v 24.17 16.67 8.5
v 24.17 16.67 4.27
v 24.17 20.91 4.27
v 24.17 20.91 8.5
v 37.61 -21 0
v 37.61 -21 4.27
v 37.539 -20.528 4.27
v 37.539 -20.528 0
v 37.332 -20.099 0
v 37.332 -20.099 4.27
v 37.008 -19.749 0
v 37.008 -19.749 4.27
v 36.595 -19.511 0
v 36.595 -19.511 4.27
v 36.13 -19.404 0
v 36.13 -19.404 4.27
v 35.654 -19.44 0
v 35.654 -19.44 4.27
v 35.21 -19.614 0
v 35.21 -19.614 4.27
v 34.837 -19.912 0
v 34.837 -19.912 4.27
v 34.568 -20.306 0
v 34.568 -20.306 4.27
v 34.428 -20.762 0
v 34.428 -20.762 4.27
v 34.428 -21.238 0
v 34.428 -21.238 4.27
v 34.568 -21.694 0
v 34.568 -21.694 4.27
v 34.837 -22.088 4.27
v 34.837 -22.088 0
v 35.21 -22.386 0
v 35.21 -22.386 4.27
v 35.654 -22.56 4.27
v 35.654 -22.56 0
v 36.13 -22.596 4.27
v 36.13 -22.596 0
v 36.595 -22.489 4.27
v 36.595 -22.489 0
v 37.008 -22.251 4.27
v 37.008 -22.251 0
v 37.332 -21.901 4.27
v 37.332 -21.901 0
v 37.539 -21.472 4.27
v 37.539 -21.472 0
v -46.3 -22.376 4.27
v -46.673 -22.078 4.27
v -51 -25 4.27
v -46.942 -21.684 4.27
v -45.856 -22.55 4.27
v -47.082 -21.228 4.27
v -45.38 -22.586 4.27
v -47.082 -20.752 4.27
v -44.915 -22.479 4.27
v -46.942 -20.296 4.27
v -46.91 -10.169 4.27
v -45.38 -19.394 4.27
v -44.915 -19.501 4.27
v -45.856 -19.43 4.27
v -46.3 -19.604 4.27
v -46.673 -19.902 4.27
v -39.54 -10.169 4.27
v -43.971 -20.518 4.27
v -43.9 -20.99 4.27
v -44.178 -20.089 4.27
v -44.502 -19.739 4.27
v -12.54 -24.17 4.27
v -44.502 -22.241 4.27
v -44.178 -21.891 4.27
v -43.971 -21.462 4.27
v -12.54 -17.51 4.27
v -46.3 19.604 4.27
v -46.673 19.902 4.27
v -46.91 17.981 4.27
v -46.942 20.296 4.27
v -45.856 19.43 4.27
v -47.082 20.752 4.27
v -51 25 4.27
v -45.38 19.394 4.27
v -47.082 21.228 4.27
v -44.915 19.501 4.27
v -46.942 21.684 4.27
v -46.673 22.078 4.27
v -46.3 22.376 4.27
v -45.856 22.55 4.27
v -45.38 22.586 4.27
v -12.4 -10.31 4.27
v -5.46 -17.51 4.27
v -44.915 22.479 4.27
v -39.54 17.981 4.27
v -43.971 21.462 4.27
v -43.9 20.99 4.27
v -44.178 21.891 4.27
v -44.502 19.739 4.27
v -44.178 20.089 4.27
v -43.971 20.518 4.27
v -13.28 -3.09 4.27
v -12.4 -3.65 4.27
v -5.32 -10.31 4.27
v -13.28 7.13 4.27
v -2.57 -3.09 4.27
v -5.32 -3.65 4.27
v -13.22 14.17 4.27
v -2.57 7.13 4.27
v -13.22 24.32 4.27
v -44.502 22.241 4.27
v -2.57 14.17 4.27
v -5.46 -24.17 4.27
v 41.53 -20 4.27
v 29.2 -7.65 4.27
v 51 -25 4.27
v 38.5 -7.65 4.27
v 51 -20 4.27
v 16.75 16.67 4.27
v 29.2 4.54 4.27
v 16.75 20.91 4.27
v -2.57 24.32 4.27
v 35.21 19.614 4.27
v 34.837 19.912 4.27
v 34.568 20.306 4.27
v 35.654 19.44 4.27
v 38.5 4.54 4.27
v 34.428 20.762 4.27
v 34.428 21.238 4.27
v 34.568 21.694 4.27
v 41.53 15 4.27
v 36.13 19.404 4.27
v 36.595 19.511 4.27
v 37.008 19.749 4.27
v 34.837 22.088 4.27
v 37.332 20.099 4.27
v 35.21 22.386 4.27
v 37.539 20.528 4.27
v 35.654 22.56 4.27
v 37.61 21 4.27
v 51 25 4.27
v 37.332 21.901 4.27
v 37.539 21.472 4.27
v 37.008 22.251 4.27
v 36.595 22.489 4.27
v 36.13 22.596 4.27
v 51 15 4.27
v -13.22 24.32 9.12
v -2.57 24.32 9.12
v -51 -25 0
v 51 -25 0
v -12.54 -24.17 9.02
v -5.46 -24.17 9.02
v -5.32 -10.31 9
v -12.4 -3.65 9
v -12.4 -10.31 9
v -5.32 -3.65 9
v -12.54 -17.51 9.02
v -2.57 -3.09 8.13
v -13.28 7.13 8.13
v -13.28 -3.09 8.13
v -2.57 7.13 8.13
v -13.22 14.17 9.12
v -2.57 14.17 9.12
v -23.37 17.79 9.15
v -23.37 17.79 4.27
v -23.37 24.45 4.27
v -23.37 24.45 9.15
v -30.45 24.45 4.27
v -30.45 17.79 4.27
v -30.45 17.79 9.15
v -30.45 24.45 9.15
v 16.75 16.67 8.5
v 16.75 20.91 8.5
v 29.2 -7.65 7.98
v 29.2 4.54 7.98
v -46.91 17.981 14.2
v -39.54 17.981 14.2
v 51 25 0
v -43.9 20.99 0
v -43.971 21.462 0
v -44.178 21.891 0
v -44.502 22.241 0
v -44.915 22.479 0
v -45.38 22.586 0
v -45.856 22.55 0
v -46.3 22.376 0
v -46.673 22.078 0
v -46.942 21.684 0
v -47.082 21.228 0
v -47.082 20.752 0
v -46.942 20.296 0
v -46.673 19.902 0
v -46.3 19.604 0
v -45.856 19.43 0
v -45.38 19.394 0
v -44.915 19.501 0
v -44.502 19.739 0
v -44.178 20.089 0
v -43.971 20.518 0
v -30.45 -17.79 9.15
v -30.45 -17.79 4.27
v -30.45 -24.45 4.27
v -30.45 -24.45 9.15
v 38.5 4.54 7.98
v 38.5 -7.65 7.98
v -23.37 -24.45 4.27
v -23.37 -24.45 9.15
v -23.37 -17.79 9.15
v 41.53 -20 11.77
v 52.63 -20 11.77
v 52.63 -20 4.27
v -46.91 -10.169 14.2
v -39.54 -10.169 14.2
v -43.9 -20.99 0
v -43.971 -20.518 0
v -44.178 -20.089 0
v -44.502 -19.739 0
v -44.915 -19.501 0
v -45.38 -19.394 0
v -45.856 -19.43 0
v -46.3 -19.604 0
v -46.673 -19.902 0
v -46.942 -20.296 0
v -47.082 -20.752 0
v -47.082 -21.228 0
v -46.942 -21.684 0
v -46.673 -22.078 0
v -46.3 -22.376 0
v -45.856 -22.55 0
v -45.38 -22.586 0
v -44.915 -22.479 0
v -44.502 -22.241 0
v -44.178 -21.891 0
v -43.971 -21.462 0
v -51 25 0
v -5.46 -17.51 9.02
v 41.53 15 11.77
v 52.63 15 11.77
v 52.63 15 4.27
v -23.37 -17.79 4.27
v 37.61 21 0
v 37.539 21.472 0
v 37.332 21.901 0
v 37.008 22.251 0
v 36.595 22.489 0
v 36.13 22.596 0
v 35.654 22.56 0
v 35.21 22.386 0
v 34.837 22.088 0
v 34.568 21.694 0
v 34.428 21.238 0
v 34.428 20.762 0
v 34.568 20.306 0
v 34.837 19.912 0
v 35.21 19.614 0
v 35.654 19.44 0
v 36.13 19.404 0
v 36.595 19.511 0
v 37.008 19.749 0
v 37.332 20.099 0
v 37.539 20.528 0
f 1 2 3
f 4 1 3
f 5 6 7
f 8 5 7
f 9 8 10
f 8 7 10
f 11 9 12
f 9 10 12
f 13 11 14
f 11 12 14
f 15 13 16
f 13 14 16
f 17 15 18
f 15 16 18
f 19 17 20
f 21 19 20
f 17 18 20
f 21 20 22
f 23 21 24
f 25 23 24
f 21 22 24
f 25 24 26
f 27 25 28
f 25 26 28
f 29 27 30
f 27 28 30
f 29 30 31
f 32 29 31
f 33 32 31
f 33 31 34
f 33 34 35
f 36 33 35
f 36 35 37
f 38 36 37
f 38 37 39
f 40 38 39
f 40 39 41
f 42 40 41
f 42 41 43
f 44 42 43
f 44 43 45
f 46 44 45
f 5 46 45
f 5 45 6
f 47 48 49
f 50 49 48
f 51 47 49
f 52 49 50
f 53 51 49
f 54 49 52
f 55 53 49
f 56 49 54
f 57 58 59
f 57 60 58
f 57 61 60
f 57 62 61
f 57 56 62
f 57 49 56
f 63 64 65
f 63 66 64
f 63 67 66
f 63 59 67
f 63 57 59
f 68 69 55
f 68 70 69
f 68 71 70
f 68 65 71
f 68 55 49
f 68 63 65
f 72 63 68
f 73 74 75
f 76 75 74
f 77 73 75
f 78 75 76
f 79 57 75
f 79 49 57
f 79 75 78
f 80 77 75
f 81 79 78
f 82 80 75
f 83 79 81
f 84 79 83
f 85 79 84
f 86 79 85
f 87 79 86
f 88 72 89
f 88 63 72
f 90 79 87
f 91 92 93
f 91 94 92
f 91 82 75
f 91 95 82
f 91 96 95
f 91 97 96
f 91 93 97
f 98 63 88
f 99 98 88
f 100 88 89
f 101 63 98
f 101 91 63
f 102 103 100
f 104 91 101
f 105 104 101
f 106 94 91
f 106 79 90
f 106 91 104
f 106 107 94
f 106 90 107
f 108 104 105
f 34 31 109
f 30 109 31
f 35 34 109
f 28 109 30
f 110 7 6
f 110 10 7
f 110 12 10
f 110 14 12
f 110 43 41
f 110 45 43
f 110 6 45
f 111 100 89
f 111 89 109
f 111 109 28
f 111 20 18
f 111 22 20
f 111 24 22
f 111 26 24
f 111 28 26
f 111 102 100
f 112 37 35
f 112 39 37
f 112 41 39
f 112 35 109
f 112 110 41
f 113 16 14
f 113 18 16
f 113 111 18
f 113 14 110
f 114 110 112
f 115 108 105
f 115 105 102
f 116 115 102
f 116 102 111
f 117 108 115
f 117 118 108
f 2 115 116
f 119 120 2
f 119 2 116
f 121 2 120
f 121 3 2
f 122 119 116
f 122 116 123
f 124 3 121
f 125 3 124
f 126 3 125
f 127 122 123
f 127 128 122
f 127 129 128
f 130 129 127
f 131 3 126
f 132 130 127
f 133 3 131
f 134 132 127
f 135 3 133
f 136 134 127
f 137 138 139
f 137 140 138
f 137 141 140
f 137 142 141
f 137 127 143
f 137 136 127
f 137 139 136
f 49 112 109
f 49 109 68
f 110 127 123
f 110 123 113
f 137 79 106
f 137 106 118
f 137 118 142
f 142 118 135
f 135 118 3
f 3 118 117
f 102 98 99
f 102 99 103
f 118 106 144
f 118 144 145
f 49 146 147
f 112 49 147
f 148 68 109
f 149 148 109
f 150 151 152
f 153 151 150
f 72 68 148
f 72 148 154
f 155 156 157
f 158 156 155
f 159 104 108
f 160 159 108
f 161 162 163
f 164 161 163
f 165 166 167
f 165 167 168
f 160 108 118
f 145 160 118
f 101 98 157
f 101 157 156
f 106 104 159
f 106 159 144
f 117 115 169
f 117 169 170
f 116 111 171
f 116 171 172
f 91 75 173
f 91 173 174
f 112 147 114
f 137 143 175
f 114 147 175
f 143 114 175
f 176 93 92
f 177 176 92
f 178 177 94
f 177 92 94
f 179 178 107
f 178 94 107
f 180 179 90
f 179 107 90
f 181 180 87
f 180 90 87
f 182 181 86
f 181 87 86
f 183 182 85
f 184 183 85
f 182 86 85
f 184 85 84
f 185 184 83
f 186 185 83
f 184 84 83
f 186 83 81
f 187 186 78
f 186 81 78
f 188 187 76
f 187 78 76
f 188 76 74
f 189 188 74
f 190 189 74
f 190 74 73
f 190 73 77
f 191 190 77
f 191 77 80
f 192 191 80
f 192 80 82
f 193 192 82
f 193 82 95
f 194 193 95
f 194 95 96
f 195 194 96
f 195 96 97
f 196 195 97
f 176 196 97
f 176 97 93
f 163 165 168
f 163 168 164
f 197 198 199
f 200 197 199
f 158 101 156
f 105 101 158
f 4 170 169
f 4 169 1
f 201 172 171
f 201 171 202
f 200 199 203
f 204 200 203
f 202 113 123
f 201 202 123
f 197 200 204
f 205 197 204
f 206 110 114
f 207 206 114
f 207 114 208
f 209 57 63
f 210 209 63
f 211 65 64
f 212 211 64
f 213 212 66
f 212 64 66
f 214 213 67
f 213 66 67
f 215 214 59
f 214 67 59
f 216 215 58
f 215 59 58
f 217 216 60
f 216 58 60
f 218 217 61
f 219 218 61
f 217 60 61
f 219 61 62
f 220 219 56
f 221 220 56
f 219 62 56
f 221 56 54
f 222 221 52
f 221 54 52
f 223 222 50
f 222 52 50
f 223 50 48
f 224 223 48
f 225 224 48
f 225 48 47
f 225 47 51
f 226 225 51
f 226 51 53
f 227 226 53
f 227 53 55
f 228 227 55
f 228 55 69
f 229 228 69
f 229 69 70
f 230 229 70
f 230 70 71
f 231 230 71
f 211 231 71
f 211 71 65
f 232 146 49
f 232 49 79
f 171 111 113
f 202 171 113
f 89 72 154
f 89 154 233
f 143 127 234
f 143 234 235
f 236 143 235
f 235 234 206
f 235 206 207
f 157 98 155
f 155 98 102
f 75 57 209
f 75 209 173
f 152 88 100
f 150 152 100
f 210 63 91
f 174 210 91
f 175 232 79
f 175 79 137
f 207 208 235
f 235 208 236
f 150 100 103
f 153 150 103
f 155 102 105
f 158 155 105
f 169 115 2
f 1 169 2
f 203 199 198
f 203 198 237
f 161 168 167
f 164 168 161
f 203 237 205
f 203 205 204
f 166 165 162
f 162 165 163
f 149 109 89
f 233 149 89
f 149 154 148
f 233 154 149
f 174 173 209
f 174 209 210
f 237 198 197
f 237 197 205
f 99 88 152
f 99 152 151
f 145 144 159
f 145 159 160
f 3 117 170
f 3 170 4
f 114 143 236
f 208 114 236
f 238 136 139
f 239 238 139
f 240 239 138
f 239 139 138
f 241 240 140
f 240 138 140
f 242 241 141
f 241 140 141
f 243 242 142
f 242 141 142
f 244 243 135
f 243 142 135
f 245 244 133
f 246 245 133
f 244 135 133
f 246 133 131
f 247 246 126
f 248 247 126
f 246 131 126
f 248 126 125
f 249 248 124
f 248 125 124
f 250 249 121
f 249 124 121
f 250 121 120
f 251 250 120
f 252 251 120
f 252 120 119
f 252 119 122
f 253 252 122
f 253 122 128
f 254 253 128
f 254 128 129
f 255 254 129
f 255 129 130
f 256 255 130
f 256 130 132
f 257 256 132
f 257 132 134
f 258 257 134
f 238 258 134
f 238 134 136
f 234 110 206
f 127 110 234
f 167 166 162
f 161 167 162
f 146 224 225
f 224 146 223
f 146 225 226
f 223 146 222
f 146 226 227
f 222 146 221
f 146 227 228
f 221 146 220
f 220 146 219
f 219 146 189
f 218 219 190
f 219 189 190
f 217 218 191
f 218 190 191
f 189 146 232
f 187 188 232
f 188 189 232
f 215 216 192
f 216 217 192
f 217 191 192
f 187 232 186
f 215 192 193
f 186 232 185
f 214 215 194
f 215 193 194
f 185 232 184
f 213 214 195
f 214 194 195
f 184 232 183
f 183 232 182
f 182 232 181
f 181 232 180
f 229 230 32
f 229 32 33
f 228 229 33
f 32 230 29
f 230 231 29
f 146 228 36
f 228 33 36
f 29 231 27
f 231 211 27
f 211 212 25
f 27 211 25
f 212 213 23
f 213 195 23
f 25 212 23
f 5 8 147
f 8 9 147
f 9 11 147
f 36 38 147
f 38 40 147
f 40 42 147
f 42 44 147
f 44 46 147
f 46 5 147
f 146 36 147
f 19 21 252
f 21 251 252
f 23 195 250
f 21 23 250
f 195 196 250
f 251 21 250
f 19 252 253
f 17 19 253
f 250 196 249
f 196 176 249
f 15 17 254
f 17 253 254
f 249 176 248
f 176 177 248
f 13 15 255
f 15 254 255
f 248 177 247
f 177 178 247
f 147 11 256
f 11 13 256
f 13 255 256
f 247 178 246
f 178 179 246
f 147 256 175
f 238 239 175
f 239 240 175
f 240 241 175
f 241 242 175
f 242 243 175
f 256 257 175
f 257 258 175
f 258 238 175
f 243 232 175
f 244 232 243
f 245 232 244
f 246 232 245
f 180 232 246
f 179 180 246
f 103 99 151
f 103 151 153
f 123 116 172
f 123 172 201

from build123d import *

# Parameters (mm, degrees)
F0_W      = 102
F0_H      = 50
F1_DEPTH  = 4.27
F2_W      = 11.1
F2_H      = 35
F3_DEPTH  = 7.5
F4_W      = 7.37
F4_H      = 28.15
F5_DEPTH  = 9.93
F6_W      = 7.08
F6_H      = 6.66
F7_DEPTH  = 4.88
F8_W      = 10.65
F8_H      = 10.15
F9_DEPTH  = 4.85
F10_W     = 10.71
F10_H     = 10.22
F11_DEPTH = 3.86
F13_W     = 7.08
F13_H     = 6.66
F14_DEPTH = 4.73
F15_W     = 7.08
F15_H     = 6.66
F16_DEPTH = 4.75
F17_W     = 9.3
F17_H     = 12.19
F18_DEPTH = 3.71
F19_W     = 7.42
F19_H     = 4.24
F20_DEPTH = 4.23
F21_R     = 1.6
F22_DEPTH = 25


with BuildPart() as f1:
    # F0 (on Top) → F1 (new body)
    with BuildSketch(Plane.XY):
        Rectangle(F0_W, F0_H)
    extrude(amount=F1_DEPTH)

    # F2 (on face) → F3 (join)
    with BuildSketch(Plane.XY.offset(4.27)):
        with Locations((47.08, -2.5)):
            Rectangle(F2_W, F2_H)
    extrude(amount=F3_DEPTH)

    # F4 (on face) → F5 (join)
    with BuildSketch(Plane.XY.offset(4.27)):
        with Locations((-43.225, 3.906207)):
            Rectangle(F4_W, F4_H)
    extrude(amount=F5_DEPTH)

    # F8 (on face) → F9 (join)
    with BuildSketch(Plane.XY.offset(4.27)):
        with Locations((-7.895, 19.245)):
            Rectangle(F8_W, F8_H)
    extrude(amount=F9_DEPTH)

    # F10 (on face) → F11 (join)
    with BuildSketch(Plane.XY.offset(4.27)):
        with Locations((-7.925, 2.02)):
            Rectangle(F10_W, F10_H)
    extrude(amount=F11_DEPTH)

    # F13 (on face) → F14 (join)
    with BuildSketch(Plane.XY.offset(4.27)):
        with Locations((-8.86, -6.98)):
            Rectangle(F13_W, F13_H)
    extrude(amount=F14_DEPTH)

    # F15 (on face) → F16 (join)
    with BuildSketch(Plane.XY.offset(4.27)):
        with Locations((-9, -20.84)):
            Rectangle(F15_W, F15_H)
    extrude(amount=F16_DEPTH)

    # F17 (on face) → F18 (join)
    with BuildSketch(Plane.XY.offset(4.27)):
        with Locations((33.85, -1.555)):
            Rectangle(F17_W, F17_H)
    extrude(amount=F18_DEPTH)

    # F19 (on face) → F20 (join)
    with BuildSketch(Plane.XY.offset(4.27)):
        with Locations((20.46, 18.79)):
            Rectangle(F19_W, F19_H)
    extrude(amount=F20_DEPTH)

    # F21 (on face) → F22 (cut)
    with BuildSketch(Plane.XY.offset(4.27)):
        with Locations((-45.5, -20.99)):
            Circle(F21_R)
        with Locations((36.01, -21)):
            Circle(F21_R)
        with Locations((-45.5, 20.99)):
            Circle(F21_R)
        with Locations((36.01, 21)):
            Circle(F21_R)
    extrude(amount=-F22_DEPTH, mode=Mode.SUBTRACT)


with BuildPart() as f7:
    # F6 (on face) → F7 (new body)
    with BuildSketch(Plane.XY.offset(4.27)):
        with Locations((-26.91, 21.12)):
            Rectangle(F6_W, F6_H)
    extrude(amount=F7_DEPTH)


with BuildPart() as f12_1:
    # F12: instance of F7
    add(f7.part.mirror(Plane.XZ))


solid = Compound([f1.part, f7.part, f12_1.part])
